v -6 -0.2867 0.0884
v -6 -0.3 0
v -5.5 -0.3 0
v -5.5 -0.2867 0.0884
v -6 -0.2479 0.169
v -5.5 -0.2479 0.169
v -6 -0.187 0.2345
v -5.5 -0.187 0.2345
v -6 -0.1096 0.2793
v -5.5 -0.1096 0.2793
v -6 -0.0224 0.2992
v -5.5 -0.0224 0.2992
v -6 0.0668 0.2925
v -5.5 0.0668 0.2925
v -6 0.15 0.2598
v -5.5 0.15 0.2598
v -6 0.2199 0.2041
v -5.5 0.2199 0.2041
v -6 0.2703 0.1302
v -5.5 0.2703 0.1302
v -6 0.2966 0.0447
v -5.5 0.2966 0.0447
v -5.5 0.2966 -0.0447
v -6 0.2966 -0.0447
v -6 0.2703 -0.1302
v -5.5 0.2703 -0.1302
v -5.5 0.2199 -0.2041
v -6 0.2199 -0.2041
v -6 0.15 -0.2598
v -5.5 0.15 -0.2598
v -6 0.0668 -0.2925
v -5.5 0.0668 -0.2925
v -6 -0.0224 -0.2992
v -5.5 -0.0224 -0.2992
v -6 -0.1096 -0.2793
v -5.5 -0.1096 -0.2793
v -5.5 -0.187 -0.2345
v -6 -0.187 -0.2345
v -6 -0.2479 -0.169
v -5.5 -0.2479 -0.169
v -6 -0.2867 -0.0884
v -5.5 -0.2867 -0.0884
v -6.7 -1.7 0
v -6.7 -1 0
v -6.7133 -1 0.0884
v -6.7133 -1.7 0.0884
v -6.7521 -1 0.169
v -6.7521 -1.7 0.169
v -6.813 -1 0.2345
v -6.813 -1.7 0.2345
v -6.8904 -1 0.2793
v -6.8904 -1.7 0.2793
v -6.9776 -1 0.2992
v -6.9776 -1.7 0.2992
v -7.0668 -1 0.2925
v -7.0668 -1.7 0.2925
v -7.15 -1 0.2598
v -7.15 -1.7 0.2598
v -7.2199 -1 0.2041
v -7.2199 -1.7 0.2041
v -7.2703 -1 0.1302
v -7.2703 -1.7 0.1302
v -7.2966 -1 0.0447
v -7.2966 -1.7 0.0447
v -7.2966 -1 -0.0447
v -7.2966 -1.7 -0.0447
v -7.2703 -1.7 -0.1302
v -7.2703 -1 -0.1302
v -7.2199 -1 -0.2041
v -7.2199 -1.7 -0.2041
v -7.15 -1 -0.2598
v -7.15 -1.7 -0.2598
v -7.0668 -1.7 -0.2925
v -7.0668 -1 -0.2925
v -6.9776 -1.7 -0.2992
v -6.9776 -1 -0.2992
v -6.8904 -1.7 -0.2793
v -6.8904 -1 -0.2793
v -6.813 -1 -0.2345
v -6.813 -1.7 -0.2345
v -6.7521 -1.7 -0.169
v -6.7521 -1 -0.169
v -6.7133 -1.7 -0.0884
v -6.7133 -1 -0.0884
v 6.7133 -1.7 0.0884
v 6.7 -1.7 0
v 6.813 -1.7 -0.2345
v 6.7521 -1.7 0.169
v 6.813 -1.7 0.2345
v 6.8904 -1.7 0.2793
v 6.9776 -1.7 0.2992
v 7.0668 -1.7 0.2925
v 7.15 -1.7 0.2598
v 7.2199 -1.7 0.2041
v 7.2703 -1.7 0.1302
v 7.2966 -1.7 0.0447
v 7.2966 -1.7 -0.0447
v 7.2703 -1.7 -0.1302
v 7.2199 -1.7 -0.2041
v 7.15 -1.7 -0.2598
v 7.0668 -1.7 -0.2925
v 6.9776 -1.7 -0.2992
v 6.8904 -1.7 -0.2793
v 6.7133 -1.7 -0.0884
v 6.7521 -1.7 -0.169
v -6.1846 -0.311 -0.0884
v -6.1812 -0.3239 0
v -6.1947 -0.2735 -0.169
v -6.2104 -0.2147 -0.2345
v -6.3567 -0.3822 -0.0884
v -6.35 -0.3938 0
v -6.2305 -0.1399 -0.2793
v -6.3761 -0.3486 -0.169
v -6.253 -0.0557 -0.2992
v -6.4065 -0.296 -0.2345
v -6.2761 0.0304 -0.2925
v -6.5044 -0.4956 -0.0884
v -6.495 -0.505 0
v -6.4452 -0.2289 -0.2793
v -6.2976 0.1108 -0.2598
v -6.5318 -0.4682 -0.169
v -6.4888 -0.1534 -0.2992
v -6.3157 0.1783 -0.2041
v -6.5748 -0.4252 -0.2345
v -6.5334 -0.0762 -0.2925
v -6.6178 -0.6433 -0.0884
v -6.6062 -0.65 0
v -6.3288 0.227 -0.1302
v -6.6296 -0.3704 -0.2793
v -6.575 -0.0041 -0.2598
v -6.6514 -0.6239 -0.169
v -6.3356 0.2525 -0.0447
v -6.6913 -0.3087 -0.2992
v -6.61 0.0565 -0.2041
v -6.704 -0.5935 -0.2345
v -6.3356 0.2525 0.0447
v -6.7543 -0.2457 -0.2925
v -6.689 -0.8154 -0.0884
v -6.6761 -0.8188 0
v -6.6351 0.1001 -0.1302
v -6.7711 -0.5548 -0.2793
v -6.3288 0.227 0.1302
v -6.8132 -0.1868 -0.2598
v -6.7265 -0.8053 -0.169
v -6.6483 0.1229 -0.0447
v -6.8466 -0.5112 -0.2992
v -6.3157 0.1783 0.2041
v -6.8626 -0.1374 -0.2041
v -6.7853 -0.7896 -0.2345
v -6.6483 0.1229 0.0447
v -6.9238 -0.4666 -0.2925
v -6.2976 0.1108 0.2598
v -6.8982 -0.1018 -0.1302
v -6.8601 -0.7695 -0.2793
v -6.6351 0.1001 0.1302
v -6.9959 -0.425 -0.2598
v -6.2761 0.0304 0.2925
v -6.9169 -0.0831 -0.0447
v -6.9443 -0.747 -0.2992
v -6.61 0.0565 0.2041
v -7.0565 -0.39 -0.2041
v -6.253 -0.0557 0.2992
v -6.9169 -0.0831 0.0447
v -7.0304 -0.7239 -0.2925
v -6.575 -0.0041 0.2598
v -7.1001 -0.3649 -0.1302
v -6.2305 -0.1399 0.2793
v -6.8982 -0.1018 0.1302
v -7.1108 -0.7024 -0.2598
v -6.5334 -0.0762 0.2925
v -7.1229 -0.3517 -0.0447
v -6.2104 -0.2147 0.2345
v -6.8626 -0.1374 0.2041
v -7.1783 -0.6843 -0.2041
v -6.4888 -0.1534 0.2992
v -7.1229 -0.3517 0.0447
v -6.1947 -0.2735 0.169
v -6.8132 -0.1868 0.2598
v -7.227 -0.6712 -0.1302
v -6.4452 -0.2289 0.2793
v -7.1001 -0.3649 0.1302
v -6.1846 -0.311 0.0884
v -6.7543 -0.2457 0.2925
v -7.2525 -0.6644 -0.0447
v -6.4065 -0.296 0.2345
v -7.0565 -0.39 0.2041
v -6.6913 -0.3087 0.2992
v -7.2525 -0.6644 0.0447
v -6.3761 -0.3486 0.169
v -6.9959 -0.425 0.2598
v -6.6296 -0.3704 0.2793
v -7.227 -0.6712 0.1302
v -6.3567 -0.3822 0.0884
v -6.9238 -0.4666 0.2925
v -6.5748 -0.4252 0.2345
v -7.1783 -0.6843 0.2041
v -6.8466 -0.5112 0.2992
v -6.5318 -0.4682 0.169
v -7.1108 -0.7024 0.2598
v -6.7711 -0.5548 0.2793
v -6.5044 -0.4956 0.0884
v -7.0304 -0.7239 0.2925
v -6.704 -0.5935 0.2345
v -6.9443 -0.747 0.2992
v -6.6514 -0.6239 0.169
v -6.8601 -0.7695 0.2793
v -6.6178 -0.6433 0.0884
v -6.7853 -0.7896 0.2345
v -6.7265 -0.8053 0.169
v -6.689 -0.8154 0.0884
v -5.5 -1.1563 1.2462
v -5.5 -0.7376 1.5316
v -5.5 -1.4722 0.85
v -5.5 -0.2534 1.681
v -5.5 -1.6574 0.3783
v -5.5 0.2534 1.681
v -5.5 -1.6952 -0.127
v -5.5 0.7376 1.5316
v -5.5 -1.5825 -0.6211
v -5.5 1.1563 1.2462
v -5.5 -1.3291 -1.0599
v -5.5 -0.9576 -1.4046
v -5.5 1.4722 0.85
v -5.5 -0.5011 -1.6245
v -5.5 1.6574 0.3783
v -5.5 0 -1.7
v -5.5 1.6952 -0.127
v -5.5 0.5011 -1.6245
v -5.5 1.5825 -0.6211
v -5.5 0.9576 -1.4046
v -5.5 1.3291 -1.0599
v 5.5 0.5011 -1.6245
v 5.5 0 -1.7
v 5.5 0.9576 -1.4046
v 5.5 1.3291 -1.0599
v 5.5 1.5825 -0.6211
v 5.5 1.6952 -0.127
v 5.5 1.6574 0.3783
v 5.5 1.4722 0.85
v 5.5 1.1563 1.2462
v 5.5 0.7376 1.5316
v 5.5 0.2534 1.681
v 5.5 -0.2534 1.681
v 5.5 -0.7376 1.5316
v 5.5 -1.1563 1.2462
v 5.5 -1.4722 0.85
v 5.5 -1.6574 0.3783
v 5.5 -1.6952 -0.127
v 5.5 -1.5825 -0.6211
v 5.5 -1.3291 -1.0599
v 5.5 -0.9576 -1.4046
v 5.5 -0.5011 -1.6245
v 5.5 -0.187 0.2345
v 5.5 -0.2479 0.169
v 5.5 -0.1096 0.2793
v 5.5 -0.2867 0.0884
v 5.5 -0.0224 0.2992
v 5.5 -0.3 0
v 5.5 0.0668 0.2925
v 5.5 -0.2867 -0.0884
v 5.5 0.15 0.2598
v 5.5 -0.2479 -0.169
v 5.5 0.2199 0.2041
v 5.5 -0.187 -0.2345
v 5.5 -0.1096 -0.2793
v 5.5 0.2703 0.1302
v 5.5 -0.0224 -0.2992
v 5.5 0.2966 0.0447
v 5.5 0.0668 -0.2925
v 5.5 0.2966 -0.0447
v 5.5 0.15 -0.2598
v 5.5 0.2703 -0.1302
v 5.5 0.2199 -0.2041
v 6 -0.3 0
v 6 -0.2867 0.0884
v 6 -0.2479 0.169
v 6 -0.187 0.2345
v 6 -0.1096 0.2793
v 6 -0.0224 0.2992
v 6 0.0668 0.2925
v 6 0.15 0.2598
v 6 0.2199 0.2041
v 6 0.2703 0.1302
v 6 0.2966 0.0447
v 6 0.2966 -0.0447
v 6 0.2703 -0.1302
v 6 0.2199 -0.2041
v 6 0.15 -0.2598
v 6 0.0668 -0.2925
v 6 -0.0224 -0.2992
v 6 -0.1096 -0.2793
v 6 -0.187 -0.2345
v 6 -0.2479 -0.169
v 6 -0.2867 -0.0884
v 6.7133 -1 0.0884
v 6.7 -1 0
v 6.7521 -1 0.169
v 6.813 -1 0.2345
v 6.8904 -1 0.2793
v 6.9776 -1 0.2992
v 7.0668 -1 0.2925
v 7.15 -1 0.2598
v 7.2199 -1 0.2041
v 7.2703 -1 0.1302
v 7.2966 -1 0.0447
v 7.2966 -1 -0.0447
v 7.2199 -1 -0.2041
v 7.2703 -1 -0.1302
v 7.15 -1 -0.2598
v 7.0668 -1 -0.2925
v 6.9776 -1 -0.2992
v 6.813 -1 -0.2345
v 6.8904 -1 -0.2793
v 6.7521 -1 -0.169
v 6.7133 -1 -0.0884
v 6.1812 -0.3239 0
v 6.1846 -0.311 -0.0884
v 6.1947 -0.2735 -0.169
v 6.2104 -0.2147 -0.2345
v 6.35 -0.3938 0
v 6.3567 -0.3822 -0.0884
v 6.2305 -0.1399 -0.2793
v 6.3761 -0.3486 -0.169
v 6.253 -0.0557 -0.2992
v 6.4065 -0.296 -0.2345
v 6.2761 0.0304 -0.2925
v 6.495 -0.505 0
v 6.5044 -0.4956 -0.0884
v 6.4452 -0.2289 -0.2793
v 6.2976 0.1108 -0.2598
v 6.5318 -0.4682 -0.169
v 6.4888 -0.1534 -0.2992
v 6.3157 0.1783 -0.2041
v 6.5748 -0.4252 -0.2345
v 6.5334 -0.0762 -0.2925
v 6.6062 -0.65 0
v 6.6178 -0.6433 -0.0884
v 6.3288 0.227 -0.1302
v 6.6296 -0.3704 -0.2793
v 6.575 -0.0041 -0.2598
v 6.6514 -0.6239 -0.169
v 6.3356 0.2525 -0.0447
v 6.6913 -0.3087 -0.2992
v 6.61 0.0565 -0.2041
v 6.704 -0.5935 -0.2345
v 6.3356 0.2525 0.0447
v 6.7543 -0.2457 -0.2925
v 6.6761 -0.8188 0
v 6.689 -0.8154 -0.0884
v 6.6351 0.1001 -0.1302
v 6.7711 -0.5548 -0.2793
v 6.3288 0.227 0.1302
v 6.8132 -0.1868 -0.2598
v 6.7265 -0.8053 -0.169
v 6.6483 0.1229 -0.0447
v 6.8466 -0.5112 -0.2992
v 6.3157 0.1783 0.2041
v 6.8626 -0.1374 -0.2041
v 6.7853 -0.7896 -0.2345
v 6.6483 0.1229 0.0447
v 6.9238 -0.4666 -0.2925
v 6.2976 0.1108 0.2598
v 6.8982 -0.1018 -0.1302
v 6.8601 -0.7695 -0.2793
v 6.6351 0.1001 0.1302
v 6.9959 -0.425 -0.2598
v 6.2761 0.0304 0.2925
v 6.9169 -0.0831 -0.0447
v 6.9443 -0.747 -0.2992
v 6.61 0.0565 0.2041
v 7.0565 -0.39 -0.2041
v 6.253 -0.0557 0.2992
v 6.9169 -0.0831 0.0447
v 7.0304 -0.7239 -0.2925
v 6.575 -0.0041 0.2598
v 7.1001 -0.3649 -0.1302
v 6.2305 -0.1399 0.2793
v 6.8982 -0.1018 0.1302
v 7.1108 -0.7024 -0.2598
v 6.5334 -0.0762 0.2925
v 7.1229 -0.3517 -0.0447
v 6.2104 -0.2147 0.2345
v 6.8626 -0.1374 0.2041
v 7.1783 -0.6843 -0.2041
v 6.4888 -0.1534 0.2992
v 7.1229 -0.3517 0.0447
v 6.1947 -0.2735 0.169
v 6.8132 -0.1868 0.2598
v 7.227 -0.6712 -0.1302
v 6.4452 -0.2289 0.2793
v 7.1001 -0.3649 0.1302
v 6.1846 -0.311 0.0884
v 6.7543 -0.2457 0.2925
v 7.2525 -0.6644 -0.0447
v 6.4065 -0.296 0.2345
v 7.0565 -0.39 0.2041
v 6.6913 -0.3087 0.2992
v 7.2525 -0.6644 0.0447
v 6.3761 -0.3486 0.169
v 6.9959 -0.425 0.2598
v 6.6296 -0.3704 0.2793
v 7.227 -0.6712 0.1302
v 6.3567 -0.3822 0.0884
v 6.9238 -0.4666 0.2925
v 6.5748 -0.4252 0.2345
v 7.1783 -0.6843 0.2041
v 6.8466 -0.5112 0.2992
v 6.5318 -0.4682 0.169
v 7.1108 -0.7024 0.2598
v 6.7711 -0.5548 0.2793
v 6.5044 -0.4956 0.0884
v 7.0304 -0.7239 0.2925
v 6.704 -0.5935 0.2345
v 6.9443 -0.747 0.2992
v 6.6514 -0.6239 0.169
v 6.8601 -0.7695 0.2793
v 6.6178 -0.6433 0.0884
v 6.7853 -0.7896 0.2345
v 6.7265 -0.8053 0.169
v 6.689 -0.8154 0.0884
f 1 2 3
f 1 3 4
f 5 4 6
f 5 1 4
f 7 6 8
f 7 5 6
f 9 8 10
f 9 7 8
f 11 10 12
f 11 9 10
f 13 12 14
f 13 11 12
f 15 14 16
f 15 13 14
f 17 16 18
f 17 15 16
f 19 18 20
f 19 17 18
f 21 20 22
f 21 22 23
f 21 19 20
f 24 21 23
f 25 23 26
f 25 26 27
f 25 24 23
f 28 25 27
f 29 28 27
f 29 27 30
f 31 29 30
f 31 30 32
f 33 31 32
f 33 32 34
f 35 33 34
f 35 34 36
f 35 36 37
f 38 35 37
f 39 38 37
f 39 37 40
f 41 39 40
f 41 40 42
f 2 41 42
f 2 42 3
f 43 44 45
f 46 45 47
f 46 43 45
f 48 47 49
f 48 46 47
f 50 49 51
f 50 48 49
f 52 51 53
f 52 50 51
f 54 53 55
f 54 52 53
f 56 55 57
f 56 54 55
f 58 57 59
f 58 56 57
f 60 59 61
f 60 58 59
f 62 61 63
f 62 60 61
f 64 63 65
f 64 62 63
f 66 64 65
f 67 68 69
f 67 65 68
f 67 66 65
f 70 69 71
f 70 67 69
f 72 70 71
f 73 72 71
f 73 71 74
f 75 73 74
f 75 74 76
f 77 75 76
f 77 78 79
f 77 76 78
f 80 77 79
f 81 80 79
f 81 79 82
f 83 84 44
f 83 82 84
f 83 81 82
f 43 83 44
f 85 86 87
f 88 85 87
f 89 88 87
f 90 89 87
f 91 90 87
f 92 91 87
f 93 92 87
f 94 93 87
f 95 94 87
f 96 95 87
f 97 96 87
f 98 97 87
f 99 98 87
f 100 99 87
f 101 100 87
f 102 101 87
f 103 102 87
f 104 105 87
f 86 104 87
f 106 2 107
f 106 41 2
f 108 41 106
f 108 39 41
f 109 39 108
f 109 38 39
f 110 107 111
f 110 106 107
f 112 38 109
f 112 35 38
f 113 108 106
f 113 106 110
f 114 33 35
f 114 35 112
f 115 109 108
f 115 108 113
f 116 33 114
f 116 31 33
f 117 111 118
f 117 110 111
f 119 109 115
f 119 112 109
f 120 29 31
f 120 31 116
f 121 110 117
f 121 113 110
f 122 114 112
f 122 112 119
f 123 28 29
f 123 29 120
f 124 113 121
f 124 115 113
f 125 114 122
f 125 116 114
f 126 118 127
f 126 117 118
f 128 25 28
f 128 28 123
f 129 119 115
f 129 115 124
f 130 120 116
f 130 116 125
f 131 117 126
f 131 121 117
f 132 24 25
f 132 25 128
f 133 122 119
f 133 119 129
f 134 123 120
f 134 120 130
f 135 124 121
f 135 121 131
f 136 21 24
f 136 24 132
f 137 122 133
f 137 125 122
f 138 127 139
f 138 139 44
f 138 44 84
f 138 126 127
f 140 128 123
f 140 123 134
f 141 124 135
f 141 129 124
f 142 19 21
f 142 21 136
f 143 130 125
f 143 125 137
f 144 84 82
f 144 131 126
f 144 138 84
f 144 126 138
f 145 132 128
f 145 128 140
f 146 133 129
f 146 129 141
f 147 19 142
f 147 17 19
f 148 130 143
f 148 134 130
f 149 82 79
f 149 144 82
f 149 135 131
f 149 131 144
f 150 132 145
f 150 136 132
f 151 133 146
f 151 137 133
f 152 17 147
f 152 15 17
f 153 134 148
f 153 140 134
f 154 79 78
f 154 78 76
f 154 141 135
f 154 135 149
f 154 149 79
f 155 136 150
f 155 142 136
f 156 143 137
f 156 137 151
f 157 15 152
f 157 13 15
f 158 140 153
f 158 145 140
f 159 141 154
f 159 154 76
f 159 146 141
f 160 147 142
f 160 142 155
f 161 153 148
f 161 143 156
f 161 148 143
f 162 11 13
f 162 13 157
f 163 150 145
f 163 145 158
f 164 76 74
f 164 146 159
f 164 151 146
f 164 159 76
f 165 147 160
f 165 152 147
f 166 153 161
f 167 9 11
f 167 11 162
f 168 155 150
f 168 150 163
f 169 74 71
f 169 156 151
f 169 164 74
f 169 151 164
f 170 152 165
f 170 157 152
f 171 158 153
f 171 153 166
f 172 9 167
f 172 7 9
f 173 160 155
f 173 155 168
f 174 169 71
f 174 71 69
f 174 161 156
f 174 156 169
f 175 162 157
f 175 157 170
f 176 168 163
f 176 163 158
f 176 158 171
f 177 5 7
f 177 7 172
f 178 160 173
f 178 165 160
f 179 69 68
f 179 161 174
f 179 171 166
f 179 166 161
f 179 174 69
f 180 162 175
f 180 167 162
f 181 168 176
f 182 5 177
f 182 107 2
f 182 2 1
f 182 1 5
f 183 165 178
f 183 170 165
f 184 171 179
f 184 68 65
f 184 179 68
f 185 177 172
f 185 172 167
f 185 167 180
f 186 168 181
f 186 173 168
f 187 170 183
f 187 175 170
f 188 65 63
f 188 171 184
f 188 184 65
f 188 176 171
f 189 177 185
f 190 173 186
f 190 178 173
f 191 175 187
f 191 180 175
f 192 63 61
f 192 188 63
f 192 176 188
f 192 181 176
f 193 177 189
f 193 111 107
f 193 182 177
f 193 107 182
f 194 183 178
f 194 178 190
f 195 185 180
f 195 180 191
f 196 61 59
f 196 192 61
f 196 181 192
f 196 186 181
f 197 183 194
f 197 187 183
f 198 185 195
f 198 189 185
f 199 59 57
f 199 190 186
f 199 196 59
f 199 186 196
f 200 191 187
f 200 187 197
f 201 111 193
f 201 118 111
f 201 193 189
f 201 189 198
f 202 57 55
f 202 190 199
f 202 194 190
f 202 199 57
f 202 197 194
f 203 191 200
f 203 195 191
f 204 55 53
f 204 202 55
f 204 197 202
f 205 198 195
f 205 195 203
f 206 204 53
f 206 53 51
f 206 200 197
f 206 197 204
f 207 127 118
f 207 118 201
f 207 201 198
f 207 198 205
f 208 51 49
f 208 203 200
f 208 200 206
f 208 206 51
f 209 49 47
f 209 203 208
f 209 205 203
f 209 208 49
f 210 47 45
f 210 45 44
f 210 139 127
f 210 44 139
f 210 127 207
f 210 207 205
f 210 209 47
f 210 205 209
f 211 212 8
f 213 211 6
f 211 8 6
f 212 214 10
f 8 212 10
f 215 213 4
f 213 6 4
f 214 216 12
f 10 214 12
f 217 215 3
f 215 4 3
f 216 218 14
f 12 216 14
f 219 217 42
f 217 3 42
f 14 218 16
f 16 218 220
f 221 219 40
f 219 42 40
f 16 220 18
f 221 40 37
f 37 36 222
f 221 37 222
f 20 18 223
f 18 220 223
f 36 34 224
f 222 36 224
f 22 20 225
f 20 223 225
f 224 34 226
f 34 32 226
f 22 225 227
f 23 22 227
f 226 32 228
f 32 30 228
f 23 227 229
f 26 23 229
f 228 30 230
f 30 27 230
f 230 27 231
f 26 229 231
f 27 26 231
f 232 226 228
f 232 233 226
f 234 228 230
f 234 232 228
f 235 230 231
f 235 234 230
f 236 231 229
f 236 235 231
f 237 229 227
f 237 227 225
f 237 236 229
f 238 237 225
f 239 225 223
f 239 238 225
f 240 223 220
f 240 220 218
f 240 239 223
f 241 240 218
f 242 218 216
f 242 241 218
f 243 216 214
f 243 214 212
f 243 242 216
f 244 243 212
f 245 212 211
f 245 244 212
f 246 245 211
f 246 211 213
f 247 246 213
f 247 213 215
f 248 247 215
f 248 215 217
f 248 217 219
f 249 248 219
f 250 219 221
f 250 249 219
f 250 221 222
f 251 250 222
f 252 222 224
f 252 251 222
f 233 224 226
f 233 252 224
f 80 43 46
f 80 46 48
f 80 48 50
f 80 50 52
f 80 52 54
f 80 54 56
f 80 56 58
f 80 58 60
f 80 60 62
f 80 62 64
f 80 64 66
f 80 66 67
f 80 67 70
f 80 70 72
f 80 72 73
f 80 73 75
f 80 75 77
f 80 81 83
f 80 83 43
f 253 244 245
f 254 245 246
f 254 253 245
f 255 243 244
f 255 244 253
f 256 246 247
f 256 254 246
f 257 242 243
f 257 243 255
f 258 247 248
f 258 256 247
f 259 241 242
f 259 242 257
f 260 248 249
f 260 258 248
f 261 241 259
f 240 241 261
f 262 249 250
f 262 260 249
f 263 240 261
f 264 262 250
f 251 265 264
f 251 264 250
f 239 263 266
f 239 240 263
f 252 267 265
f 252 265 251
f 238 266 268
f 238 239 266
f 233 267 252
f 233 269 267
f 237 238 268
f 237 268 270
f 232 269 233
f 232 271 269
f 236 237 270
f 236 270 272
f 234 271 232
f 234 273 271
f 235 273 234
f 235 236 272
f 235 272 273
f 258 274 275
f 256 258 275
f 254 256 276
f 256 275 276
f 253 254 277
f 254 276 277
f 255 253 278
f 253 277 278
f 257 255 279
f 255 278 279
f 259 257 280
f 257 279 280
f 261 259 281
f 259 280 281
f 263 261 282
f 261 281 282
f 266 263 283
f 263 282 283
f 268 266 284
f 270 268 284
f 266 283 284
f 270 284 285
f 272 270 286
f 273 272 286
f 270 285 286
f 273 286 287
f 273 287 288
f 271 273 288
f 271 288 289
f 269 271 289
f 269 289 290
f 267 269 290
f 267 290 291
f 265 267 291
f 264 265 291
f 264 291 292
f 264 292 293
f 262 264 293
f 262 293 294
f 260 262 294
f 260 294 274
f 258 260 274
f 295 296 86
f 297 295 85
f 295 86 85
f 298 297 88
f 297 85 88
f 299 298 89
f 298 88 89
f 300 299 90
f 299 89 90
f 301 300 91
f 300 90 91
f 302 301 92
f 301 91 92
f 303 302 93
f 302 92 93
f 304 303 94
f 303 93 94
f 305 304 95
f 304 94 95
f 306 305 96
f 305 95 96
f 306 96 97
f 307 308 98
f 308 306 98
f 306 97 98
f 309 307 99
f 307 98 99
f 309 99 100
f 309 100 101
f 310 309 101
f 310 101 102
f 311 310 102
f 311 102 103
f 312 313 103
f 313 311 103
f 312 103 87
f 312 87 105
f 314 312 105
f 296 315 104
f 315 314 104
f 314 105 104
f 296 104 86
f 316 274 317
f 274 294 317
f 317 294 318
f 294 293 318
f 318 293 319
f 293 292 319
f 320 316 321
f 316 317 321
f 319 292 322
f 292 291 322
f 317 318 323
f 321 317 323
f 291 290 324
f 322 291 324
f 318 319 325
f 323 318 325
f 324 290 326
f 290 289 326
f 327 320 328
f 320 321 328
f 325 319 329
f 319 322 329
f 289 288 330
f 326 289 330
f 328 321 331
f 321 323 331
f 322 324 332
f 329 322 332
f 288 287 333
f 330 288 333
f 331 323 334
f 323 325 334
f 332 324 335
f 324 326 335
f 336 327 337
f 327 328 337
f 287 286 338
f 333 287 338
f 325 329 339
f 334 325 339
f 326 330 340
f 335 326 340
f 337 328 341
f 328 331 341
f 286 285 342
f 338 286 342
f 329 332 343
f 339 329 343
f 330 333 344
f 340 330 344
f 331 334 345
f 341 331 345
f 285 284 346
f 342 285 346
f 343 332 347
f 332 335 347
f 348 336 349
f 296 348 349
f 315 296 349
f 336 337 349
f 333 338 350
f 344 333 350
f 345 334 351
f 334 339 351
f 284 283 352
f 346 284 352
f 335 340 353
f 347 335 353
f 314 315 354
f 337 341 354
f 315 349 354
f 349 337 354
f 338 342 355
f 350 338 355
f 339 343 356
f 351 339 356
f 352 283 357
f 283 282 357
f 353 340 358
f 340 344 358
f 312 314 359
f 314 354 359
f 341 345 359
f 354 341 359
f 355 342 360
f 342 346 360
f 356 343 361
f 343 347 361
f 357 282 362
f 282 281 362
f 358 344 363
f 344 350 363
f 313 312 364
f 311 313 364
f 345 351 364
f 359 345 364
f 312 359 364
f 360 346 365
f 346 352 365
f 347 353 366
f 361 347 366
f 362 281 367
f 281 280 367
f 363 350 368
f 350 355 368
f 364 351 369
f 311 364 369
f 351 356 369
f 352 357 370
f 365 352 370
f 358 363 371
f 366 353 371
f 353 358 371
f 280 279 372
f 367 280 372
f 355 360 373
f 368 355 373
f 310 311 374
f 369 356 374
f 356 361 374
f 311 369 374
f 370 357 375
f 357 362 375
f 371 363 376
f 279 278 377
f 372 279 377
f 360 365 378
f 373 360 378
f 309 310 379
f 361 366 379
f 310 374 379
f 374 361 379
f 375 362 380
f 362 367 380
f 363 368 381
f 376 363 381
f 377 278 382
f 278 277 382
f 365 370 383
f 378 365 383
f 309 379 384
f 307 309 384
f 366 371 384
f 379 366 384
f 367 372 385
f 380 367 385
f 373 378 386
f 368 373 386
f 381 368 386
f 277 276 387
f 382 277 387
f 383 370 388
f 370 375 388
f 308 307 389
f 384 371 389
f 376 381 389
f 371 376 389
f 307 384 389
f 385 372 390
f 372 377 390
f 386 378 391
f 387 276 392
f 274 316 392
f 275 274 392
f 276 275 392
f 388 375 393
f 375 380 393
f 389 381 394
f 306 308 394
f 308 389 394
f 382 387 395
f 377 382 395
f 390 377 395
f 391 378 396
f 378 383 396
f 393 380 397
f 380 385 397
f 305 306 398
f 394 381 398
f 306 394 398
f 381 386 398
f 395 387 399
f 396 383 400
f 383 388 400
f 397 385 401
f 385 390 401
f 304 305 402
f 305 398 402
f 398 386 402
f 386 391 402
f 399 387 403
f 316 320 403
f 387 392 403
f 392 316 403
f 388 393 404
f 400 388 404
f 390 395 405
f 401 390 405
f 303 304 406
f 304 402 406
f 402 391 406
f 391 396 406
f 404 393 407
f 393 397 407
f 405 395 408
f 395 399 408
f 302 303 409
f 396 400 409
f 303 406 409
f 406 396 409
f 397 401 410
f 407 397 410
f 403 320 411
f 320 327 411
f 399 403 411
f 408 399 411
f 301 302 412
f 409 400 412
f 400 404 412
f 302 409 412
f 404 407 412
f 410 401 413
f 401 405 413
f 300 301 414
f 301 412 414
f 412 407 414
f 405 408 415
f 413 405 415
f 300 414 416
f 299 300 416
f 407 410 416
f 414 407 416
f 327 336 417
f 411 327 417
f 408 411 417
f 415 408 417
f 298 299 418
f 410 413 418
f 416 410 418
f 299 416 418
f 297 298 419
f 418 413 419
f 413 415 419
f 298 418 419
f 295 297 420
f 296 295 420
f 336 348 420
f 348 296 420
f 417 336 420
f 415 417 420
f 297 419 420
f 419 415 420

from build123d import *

# Parameters (mm, degrees)
BOSS_EXTRUDE1_DEPTH      = 5.5
BOSS_EXTRUDE1_DEPTH_BACK = 5.5
SKETCH1_R                = 1.7
SWEEP1_PROFILE_R         = 0.3


with BuildPart() as part:
    # Sketch1 → Boss-Extrude1 (new, two sides: drawn at the far end of the back side and taken through both)
    with BuildSketch(Plane(origin=(0, 0, 0), x_dir=(0, 0, -1), z_dir=(1, 0, 0)).offset(-BOSS_EXTRUDE1_DEPTH_BACK)):
        Circle(SKETCH1_R)
    extrude(amount=BOSS_EXTRUDE1_DEPTH + BOSS_EXTRUDE1_DEPTH_BACK)

    # Sweep1: sweep along a path in Sketch2
    with BuildLine(Plane.XY) as sweep1_path:
        Line((-5.5, 0), (-6, 0))
        ThreePointArc((-6, 0), (-6.707106781, -0.292893219), (-7, -1))
        Line((-7, -1), (-7, -1.7))
    # Sweep1 profile (on start of the path) → Sweep1 (sweep)
    with BuildSketch(Plane(origin=(-5.5, 0, 0), x_dir=(0, -1, 0), z_dir=(-1, 0, 0))):
        Circle(SWEEP1_PROFILE_R)
    sweep1 = sweep(path=sweep1_path.line)

    # Mirror1: Sweep1 across plane
    add(sweep1.mirror(Plane(origin=(0, 0, 0), x_dir=(0, 0, 1), z_dir=(1, 0, 0))))


solid = part.part
